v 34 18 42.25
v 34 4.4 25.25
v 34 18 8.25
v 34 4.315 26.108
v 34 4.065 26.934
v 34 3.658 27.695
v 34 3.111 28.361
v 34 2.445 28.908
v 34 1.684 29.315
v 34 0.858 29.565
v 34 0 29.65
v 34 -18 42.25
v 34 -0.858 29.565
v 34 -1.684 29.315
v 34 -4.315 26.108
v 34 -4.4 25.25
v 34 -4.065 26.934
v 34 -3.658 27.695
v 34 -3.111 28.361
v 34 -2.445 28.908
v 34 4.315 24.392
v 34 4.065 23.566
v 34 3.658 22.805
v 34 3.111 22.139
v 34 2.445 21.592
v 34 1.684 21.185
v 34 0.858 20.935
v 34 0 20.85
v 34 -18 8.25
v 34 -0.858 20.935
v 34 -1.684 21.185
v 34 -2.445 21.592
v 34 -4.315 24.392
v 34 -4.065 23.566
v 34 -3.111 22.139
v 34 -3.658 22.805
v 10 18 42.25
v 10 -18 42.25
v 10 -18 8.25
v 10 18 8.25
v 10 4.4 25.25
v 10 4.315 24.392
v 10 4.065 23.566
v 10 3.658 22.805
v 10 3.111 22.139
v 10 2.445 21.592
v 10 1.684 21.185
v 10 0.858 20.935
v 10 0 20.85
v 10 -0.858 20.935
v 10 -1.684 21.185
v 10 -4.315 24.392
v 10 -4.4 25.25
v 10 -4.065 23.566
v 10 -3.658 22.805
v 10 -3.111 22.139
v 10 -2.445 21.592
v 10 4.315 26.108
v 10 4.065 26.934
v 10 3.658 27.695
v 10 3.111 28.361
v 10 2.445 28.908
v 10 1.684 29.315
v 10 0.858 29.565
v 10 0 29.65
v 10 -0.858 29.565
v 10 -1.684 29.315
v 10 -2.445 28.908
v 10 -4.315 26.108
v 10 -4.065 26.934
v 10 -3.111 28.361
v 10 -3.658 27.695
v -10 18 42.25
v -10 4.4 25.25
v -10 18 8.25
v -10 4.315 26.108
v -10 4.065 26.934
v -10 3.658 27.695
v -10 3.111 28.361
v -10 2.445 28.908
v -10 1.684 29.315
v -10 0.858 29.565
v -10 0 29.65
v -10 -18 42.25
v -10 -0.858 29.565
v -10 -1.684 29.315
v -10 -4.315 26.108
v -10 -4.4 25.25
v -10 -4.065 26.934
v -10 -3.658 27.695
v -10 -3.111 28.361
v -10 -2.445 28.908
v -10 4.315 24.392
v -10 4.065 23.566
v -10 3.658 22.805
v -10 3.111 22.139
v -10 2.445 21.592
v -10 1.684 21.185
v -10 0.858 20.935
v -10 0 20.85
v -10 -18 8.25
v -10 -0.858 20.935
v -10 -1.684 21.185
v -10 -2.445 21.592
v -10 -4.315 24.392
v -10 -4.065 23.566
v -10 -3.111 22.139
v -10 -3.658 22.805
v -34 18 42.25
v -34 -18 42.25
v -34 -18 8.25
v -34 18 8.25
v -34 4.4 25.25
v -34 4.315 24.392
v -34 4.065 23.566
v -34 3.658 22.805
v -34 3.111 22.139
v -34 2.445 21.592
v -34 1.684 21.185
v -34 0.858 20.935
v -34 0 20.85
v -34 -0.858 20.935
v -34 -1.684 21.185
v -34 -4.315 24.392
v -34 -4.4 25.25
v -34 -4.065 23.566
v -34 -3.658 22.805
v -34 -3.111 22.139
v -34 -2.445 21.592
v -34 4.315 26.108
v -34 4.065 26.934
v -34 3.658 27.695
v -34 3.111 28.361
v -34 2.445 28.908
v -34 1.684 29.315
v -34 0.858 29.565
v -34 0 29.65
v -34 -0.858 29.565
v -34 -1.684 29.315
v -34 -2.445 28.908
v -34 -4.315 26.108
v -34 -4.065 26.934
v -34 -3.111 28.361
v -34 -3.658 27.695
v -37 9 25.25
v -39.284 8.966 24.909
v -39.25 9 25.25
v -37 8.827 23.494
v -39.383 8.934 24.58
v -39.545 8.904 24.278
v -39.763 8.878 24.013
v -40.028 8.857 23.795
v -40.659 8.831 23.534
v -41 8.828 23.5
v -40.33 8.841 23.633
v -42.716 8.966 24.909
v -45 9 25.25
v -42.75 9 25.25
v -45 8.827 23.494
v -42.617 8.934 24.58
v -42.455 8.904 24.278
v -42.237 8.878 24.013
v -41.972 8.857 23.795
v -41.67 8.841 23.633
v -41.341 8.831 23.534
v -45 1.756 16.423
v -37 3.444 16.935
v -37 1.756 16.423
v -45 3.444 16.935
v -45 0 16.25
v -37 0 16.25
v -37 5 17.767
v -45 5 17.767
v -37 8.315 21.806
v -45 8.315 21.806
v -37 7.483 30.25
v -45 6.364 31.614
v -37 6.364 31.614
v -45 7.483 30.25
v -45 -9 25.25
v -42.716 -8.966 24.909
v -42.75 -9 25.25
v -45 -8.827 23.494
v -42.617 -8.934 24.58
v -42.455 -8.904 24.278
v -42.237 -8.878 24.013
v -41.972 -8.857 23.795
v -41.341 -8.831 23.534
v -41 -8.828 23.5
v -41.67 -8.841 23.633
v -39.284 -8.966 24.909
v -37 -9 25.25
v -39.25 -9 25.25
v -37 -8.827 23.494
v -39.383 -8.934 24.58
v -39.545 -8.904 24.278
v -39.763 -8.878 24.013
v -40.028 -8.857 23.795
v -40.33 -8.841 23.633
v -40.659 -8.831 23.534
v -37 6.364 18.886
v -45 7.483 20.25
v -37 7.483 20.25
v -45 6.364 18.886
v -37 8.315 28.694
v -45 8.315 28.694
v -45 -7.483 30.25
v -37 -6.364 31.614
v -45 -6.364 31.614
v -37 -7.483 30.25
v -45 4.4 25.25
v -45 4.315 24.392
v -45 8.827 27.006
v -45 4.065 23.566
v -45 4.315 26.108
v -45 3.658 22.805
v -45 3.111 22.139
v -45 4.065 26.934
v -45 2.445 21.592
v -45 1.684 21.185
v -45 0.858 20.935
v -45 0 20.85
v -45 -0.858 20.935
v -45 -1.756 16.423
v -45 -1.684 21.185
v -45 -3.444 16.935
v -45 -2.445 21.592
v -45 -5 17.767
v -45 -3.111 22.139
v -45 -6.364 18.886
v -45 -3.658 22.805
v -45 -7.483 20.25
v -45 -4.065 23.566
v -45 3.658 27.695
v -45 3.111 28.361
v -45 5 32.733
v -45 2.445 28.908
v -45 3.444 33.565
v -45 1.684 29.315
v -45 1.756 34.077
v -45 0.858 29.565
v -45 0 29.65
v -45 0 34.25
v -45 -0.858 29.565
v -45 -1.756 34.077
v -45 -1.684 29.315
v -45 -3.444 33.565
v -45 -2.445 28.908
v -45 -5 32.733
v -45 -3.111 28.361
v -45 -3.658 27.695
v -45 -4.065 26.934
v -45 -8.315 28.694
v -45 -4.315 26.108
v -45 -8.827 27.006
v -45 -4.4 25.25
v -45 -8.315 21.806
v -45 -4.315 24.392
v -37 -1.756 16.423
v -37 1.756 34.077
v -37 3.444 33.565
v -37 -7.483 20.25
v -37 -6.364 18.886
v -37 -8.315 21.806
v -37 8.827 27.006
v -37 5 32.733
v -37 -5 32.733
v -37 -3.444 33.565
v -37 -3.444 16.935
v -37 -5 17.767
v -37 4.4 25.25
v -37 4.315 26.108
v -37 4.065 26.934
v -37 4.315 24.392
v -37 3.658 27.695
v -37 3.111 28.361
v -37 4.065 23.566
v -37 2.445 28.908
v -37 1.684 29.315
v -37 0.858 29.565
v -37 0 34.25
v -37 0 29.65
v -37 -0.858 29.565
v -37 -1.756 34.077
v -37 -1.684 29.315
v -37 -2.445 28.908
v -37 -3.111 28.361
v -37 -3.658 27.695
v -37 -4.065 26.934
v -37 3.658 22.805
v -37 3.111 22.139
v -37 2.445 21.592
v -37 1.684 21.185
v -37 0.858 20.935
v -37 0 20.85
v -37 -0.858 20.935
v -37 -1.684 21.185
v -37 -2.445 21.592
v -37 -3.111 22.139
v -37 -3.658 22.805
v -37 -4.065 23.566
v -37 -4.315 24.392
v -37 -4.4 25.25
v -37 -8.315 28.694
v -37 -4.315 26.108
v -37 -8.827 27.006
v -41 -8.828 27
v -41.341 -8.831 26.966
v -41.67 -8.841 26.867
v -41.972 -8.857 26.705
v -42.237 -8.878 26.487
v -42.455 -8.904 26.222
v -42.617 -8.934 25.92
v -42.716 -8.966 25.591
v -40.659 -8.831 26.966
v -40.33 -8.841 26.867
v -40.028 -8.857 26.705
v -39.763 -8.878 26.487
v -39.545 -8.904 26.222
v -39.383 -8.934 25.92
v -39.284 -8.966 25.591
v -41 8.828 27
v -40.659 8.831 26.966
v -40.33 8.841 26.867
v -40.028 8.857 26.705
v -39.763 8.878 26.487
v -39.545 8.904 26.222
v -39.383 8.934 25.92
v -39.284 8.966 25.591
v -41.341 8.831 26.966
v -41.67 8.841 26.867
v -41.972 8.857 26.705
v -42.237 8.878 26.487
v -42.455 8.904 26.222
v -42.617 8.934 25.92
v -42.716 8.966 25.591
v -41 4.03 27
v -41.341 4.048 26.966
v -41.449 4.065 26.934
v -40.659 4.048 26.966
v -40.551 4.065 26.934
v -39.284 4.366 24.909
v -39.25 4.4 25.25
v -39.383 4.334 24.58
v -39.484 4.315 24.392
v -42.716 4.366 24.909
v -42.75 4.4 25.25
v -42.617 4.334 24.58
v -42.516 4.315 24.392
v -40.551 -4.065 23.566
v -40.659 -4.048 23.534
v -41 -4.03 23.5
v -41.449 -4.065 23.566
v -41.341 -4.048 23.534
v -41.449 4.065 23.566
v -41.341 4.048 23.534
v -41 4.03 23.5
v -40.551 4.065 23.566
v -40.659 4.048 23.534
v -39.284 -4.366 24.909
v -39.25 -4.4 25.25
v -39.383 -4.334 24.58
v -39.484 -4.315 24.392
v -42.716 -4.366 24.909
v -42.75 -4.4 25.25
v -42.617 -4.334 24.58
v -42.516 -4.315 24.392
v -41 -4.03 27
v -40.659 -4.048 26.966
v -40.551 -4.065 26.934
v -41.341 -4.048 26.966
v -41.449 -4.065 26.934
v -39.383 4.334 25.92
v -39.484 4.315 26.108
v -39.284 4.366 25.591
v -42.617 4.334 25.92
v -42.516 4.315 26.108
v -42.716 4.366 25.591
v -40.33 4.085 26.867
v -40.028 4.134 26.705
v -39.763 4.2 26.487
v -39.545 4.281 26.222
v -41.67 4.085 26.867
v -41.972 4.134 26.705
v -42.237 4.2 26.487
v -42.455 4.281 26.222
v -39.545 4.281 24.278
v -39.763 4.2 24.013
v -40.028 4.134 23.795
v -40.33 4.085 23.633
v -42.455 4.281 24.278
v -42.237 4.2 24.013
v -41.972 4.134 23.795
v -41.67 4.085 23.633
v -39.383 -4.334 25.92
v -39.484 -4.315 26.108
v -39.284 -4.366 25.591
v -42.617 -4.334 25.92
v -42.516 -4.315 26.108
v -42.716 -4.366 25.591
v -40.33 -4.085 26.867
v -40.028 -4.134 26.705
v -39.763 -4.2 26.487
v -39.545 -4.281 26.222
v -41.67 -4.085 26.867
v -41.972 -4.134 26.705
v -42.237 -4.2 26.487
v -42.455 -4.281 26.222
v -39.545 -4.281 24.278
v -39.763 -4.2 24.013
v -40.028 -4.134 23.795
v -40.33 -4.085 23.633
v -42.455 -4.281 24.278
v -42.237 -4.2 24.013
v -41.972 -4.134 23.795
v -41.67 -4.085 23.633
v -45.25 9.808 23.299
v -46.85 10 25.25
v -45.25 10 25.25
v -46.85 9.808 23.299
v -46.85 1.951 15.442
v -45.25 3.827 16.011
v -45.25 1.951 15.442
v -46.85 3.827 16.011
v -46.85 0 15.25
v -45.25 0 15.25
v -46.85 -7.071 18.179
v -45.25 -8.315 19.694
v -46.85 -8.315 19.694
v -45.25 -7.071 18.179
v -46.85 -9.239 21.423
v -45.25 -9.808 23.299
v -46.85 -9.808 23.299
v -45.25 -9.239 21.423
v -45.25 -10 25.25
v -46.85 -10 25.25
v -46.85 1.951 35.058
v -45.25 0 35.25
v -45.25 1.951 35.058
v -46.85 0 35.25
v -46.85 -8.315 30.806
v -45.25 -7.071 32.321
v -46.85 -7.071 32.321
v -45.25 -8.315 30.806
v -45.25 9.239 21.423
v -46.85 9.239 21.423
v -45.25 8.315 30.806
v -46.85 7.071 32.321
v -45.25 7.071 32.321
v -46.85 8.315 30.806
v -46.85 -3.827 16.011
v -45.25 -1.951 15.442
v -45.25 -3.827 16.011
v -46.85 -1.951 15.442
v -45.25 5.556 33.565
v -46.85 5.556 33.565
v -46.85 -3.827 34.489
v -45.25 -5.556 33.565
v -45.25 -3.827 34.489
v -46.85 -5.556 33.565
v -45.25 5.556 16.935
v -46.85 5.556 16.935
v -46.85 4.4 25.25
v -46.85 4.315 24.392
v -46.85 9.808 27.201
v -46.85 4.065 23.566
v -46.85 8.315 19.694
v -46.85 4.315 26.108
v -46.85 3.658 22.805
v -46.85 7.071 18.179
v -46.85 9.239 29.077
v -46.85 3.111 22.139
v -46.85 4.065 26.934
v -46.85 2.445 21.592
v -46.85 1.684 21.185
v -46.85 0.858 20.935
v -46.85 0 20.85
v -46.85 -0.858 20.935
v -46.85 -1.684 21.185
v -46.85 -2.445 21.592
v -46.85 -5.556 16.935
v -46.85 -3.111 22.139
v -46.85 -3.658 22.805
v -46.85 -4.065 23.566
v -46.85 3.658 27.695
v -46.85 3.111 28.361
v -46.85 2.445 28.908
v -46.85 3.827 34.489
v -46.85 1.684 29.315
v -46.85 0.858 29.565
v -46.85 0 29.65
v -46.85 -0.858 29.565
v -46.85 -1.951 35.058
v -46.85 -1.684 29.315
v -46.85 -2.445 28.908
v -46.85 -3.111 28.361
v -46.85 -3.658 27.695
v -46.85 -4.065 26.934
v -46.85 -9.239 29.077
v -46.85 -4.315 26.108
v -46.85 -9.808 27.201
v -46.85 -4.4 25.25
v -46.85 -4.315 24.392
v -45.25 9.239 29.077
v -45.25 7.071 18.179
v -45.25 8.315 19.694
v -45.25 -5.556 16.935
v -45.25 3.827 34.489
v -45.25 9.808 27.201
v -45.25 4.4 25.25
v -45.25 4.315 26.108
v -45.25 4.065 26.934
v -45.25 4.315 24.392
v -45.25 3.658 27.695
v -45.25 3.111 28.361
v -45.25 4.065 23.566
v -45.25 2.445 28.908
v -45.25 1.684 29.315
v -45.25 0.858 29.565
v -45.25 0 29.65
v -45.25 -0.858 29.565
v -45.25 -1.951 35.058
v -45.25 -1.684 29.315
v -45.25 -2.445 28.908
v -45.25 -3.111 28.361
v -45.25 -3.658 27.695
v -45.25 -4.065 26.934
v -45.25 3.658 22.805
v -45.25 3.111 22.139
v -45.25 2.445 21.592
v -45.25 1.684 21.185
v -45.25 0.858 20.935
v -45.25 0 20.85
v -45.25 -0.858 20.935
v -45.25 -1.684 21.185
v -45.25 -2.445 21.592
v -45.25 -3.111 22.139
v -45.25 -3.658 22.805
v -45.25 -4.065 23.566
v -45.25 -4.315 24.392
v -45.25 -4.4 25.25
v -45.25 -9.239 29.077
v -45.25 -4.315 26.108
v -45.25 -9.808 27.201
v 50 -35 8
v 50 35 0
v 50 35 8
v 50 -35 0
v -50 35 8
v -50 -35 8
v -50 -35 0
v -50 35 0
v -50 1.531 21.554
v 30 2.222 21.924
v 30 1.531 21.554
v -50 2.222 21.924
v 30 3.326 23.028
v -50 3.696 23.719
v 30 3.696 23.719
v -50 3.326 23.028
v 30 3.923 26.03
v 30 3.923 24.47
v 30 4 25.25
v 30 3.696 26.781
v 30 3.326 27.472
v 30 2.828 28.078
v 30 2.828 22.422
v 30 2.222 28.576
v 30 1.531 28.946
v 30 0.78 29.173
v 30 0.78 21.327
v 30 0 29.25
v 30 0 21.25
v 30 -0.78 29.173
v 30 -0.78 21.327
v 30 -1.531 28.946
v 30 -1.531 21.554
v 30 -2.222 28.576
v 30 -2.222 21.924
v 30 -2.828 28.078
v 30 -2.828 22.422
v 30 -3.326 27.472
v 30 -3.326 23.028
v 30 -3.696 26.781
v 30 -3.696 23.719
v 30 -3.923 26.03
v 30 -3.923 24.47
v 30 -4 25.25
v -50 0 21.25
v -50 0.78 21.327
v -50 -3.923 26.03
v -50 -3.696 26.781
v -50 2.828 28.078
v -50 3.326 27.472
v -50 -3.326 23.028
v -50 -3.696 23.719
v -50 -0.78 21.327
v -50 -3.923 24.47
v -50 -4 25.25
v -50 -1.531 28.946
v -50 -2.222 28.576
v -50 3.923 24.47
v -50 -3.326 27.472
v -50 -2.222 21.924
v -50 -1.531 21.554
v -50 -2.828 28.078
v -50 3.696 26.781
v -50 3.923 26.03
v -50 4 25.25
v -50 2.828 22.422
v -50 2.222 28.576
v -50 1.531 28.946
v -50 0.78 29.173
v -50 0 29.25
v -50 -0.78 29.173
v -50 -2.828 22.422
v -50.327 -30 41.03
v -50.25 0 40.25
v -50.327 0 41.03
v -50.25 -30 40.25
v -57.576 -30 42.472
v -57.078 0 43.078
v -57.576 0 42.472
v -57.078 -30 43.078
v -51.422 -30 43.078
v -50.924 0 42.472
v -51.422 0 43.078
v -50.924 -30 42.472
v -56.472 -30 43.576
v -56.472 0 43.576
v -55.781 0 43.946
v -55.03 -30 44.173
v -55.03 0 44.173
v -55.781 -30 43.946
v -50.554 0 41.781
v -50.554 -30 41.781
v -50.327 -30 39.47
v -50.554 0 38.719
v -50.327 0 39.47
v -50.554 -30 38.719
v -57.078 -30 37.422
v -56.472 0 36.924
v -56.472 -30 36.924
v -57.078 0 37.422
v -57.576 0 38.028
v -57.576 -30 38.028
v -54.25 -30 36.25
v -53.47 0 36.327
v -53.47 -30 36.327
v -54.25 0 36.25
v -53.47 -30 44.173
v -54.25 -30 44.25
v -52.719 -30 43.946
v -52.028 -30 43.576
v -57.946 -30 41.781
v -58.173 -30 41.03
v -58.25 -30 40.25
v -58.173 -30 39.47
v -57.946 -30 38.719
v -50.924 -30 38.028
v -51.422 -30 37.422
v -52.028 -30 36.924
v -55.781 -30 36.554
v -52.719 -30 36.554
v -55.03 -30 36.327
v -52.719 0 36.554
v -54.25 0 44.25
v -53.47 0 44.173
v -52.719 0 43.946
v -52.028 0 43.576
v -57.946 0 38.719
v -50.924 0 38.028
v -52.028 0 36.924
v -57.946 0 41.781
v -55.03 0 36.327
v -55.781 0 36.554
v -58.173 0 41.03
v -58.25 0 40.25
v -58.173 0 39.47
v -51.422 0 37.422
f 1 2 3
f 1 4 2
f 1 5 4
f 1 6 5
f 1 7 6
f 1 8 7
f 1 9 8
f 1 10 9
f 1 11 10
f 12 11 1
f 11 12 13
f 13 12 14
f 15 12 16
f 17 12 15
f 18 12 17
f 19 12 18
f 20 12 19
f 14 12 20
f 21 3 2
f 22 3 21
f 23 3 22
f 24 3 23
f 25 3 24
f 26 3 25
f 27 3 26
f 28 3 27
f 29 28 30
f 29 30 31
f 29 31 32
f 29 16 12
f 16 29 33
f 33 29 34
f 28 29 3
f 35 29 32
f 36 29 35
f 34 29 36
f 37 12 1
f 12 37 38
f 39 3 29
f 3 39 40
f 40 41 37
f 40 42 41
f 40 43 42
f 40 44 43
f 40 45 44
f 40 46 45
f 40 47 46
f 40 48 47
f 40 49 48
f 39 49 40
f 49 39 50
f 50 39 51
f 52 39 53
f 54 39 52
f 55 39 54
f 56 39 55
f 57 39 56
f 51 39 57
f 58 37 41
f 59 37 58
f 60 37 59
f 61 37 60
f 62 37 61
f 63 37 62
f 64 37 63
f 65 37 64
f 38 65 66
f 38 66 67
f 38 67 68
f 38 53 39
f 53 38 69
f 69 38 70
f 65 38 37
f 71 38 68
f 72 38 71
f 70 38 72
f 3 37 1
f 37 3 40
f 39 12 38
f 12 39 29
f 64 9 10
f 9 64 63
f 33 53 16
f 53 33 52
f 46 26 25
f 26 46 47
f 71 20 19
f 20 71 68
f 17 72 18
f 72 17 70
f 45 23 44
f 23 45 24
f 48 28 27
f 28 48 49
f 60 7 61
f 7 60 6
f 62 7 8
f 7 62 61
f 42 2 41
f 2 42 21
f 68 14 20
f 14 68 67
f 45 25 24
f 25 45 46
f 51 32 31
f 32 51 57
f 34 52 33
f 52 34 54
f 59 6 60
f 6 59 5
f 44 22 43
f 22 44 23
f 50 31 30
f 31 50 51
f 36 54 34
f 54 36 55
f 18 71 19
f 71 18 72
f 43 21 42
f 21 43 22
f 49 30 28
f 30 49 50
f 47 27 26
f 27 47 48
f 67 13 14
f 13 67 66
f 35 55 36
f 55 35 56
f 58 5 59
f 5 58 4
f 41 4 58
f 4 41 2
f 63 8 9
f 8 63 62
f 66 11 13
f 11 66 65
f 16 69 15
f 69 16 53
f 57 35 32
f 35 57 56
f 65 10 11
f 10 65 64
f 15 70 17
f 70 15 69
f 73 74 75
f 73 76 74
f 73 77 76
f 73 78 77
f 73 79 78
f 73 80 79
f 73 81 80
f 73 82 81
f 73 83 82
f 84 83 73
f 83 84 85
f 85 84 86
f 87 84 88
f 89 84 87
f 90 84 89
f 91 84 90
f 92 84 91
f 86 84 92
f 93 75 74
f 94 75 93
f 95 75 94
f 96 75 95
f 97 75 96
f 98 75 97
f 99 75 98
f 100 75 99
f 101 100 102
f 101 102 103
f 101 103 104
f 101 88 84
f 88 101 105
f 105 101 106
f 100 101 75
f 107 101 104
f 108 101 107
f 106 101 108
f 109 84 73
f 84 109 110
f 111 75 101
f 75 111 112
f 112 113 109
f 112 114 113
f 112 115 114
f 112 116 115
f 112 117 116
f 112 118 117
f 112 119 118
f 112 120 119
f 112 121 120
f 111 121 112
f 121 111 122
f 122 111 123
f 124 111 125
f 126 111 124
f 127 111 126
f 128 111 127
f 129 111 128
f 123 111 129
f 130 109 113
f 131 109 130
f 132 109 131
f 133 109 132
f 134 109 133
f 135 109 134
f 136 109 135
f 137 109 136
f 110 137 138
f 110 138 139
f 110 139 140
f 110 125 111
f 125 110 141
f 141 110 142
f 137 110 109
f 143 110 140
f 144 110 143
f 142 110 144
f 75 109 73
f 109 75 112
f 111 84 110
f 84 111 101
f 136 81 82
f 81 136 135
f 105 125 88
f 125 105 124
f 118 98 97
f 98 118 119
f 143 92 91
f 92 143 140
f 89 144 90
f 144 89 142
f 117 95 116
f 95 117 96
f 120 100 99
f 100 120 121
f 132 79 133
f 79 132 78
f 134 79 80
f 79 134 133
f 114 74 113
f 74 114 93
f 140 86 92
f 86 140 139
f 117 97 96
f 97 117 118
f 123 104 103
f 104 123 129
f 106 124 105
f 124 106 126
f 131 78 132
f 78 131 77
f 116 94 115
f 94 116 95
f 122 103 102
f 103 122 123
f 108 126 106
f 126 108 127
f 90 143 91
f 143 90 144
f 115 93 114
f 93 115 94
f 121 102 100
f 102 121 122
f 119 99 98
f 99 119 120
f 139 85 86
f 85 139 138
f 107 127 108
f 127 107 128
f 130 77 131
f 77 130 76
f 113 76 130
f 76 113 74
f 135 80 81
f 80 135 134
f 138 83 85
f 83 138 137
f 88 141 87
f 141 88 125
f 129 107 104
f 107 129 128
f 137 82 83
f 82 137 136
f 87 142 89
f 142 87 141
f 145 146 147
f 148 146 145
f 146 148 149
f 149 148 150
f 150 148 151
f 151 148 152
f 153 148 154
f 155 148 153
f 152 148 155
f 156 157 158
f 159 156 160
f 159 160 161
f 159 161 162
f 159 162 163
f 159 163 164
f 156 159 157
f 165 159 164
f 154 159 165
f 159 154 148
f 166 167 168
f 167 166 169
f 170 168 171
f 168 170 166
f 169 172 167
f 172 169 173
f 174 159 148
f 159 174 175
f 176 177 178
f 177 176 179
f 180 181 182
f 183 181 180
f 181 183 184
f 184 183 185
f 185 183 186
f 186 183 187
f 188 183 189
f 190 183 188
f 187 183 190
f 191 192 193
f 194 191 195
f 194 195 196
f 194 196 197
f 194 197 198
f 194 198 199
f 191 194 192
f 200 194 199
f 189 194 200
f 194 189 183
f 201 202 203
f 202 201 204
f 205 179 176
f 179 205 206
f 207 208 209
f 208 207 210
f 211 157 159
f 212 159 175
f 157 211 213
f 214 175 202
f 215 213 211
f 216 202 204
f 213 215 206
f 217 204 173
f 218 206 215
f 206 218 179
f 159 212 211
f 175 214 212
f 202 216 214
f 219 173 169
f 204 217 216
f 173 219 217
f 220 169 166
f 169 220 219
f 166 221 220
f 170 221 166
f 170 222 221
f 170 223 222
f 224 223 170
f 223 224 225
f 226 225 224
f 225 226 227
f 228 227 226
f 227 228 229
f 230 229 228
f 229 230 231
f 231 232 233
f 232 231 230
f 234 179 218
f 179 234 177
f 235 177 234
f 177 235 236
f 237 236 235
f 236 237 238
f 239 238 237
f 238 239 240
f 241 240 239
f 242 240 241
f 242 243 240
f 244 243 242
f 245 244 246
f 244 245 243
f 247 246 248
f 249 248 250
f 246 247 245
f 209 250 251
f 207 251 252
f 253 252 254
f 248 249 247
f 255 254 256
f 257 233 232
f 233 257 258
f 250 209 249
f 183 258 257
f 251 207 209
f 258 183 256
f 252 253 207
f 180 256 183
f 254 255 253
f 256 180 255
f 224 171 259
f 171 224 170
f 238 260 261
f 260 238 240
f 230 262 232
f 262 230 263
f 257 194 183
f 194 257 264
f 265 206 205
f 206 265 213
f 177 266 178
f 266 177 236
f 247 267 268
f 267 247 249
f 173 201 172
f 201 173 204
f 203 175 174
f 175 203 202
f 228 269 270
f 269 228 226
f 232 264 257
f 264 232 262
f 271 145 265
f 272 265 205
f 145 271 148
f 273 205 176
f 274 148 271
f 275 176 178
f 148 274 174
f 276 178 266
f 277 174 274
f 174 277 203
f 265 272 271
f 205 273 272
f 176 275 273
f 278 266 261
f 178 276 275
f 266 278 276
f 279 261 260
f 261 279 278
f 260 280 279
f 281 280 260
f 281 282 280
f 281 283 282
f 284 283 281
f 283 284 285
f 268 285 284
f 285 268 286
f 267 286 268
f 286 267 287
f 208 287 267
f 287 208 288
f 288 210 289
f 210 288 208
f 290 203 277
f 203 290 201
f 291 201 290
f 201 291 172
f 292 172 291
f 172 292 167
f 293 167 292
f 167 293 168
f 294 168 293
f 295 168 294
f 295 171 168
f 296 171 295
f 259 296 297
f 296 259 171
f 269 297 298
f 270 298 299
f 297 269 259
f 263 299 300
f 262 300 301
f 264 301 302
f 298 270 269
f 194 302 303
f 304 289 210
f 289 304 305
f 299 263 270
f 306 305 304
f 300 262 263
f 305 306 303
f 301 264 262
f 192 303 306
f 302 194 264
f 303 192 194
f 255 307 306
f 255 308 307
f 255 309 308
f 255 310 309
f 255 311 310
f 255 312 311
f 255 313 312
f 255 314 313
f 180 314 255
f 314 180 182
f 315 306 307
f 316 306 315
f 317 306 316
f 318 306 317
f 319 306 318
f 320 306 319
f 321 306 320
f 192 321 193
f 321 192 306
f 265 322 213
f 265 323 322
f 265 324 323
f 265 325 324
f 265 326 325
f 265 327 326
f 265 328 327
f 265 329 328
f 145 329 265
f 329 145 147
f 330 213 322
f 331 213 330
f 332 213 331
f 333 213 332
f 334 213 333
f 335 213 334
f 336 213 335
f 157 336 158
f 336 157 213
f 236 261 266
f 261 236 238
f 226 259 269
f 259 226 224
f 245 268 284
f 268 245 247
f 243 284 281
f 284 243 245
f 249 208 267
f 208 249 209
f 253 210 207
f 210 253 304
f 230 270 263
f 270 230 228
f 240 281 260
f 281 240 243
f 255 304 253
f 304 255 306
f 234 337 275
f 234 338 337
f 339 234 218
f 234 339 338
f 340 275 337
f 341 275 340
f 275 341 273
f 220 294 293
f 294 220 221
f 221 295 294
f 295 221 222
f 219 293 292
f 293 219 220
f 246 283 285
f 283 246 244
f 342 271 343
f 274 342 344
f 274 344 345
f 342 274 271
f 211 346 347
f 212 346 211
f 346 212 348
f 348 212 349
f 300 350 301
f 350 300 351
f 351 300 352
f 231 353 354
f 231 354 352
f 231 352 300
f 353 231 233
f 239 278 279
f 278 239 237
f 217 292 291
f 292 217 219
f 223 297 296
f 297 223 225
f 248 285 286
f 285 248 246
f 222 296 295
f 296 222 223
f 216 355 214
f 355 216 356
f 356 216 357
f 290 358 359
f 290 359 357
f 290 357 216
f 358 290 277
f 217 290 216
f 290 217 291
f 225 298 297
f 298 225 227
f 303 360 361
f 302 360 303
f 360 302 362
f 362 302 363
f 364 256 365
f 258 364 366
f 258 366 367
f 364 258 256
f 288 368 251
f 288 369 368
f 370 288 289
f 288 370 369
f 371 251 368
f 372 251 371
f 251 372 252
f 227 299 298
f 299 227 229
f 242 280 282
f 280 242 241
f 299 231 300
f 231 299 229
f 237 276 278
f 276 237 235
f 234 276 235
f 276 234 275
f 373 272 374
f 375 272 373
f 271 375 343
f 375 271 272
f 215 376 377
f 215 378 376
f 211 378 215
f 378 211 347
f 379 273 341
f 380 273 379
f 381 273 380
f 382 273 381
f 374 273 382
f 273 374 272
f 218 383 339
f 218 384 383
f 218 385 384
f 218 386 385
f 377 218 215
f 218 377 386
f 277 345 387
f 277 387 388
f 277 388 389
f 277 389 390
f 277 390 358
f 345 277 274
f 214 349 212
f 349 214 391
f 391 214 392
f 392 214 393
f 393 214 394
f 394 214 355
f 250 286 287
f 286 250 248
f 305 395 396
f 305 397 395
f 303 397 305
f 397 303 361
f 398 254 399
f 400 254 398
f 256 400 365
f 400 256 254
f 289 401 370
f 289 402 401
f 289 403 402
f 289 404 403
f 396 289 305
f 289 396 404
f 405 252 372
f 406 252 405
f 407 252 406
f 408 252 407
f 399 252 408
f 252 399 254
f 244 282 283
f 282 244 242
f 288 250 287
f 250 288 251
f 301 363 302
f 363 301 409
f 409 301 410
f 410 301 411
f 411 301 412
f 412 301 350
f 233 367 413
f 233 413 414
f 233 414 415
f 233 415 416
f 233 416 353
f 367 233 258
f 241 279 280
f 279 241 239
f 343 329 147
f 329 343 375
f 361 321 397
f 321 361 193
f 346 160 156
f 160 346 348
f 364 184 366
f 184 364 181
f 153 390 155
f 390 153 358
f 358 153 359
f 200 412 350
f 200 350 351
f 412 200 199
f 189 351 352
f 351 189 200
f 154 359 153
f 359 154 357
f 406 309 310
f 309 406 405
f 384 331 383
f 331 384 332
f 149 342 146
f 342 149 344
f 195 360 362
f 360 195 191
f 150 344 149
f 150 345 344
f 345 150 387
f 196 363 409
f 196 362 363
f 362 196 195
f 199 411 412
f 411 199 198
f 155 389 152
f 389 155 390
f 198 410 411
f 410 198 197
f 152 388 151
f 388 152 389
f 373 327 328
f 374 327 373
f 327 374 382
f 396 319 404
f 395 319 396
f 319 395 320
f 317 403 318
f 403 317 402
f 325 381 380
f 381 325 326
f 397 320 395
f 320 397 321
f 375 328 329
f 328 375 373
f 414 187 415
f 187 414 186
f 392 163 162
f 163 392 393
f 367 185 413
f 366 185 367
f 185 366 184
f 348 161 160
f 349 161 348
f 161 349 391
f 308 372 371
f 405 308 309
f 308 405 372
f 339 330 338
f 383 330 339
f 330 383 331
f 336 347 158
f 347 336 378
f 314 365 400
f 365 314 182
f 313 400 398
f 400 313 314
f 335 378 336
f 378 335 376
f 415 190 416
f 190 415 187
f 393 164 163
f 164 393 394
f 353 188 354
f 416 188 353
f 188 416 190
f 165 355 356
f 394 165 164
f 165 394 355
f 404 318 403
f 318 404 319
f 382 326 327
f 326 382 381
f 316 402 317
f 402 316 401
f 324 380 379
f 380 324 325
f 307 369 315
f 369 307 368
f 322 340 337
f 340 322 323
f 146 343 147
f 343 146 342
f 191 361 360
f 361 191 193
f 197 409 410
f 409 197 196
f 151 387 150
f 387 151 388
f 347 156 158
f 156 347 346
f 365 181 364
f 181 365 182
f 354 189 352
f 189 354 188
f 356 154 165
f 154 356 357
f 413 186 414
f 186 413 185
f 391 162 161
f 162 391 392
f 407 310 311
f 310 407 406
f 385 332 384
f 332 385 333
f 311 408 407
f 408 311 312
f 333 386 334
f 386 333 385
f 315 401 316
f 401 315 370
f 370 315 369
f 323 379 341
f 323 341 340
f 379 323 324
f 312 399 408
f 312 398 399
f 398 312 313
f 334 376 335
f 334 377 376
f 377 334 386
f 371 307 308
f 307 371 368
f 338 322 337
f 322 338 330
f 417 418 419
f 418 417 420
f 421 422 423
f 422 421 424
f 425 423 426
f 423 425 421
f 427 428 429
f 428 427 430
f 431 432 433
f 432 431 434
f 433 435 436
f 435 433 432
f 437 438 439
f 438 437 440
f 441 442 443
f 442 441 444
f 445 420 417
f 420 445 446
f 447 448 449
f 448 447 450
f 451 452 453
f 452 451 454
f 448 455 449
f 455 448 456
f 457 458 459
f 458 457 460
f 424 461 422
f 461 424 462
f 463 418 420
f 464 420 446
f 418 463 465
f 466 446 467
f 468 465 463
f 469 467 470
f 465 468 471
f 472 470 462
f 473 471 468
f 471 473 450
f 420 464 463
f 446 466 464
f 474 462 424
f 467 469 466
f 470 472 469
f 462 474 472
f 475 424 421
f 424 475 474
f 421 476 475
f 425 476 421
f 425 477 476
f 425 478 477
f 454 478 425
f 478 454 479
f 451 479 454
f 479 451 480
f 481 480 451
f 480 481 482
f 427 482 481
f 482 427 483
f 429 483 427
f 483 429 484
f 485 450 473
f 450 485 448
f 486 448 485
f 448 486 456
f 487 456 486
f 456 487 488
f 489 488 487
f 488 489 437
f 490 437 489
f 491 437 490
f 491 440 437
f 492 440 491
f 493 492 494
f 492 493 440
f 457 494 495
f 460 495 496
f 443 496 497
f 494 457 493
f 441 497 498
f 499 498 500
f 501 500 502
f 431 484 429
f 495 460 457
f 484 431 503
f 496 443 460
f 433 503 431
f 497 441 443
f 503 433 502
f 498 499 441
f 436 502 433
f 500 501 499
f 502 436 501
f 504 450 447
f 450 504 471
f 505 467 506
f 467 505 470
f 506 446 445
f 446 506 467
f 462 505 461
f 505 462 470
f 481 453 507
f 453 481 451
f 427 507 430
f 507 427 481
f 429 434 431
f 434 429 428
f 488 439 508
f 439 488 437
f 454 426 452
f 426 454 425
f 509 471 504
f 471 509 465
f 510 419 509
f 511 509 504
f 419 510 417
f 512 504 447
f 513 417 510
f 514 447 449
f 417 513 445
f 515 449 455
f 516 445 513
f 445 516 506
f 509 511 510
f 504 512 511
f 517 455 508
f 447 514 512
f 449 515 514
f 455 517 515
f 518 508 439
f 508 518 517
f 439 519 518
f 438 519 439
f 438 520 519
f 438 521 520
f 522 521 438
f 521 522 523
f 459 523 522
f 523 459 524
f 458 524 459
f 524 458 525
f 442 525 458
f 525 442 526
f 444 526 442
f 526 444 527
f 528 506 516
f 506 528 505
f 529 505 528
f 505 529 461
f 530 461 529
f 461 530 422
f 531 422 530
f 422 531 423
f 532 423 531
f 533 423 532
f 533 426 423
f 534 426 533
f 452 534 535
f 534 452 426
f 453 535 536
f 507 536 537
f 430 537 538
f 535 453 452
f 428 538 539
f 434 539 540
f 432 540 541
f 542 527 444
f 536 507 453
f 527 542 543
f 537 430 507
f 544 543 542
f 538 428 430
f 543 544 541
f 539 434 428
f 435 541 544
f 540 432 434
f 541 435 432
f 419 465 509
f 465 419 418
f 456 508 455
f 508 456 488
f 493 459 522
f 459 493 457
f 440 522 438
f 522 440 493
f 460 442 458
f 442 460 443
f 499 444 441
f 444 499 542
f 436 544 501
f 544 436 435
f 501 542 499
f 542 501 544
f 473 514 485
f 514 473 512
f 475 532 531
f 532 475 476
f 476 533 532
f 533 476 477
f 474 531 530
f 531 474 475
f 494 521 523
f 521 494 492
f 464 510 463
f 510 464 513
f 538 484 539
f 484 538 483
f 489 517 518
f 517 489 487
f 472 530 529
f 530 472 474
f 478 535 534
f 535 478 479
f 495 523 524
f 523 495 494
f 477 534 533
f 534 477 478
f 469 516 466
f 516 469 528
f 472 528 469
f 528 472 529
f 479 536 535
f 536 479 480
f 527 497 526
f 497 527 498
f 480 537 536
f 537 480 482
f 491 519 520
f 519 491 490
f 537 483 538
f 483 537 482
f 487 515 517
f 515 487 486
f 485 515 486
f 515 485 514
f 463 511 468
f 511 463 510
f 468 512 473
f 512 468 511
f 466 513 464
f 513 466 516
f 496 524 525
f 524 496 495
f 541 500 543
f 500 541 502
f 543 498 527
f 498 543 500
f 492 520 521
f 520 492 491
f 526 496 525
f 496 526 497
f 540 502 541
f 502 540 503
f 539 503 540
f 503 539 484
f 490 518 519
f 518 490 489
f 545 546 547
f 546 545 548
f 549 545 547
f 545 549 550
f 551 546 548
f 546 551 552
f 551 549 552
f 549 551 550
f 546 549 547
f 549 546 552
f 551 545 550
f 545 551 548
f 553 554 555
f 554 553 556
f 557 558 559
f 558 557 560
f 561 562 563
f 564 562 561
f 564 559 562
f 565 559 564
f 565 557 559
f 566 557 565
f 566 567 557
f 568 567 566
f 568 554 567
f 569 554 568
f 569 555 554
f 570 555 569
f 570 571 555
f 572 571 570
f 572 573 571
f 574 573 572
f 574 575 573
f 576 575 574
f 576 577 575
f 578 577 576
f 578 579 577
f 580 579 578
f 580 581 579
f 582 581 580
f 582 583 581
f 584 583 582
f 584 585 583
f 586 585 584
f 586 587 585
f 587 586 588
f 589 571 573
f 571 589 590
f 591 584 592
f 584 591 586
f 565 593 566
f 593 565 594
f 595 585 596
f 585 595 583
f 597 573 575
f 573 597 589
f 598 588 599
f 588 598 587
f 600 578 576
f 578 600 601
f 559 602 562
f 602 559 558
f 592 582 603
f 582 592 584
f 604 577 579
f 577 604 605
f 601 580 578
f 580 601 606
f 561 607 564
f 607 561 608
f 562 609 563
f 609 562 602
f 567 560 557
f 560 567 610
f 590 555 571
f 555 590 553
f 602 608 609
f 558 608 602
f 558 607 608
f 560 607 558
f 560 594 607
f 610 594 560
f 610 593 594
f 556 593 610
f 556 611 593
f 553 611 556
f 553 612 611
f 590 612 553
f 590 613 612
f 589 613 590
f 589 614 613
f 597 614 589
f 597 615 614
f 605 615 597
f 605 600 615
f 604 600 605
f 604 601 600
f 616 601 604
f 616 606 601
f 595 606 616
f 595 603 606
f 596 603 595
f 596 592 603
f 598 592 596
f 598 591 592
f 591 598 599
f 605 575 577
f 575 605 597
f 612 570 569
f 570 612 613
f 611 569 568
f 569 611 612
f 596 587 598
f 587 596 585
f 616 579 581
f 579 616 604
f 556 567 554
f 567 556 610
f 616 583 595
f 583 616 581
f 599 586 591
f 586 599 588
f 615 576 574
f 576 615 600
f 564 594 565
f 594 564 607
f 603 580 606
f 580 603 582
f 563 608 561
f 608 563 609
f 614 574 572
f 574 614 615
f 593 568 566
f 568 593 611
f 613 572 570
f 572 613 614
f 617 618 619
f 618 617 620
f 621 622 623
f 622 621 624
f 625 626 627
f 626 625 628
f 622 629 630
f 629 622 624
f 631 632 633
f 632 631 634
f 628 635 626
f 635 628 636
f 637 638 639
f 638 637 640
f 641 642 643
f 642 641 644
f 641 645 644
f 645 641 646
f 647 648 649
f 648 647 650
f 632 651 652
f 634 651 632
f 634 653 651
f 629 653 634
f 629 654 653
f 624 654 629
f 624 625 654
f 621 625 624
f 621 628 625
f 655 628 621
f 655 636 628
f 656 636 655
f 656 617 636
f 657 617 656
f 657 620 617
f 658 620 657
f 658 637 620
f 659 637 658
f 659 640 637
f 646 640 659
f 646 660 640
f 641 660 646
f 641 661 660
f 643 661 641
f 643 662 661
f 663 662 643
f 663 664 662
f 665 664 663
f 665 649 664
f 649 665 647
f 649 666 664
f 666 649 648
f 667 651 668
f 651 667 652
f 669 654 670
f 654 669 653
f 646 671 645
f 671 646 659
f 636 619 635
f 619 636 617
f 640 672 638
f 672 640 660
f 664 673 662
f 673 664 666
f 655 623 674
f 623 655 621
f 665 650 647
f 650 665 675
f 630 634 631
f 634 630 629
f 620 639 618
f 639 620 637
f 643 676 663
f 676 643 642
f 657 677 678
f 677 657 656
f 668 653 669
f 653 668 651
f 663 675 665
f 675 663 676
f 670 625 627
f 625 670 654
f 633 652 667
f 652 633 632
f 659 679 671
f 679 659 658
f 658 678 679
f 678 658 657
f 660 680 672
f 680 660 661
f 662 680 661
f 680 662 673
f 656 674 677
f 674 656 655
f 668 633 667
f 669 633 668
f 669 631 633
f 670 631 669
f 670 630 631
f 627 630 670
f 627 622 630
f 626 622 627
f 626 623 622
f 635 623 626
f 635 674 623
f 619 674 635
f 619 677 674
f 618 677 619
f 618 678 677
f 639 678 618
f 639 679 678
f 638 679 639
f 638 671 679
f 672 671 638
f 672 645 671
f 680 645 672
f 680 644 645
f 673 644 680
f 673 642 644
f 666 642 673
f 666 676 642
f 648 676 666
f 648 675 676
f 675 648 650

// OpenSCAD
$fn = 32;

// ------------------------------------------------------------------------
// Machine vise: screw d8, jaws 24 x 34 mm
// Every part is its own module, assembly() places every instance.
// ------------------------------------------------------------------------

// --- part 1 ---
module vise_bed() {
  difference() {
    translate([-50, -35, 0]) cube([100, 70, 8]);
  }
}

// --- part 2 ---
module vise_jaw() {
  difference() {
    translate([-12, -18, 0]) cube([24, 36, 34]);
    translate([0, 0, 17]) rotate([0, 90, 0]) cylinder(h = 26, d = 8.8, center = true);
  }
}

// --- part 3 ---
module vise_screw() {
  translate([0, 0, -40]) cylinder(h = 80, d = 8);
}

// --- part 4 ---
module screw_collar() {
  difference() {
    cylinder(h = 8, d = 18);
    translate([0, 0, -1]) cylinder(h = 10, d = 8.8);
    translate([0, 0, 4]) rotate([90, 0, 0]) cylinder(h = 20, d = 3.5, center = true);
  }
}

// --- part 5 ---
module screw_washer() {
  difference() {
      translate([0, 0, 0]) cylinder(h = 1.6, d = 20);
      translate([0, 0, -1]) cylinder(h = 3.6, d = 8.8);
    }
}

// --- part 6 ---
module vise_handle() {
  cylinder(h = 30, d = 8);
}

// --- assembly ---
module assembly() {
  color([0.80, 0.24, 0.20]) translate([0, 0, 0]) rotate([0, 0, 0]) vise_bed();
  color([0.20, 0.45, 0.75]) translate([22, 0, 8.25]) rotate([0, 0, 0]) vise_jaw();
  color([0.25, 0.62, 0.32]) translate([-22, 0, 8.25]) rotate([0, 0, 0]) vise_jaw();
  color([0.92, 0.70, 0.18]) translate([-10, 0, 25.25]) rotate([0, 90, 0]) vise_screw();
  color([0.58, 0.35, 0.70]) translate([-45, 0, 25.25]) rotate([0, 90, 0]) screw_collar();
  color([0.16, 0.66, 0.66]) translate([-46.85, 0, 25.25]) rotate([0, 90, 0]) screw_washer();
  color([0.85, 0.48, 0.18]) translate([-54.25, 0, 40.25]) rotate([90, 0, 0]) vise_handle();
}

assembly();
